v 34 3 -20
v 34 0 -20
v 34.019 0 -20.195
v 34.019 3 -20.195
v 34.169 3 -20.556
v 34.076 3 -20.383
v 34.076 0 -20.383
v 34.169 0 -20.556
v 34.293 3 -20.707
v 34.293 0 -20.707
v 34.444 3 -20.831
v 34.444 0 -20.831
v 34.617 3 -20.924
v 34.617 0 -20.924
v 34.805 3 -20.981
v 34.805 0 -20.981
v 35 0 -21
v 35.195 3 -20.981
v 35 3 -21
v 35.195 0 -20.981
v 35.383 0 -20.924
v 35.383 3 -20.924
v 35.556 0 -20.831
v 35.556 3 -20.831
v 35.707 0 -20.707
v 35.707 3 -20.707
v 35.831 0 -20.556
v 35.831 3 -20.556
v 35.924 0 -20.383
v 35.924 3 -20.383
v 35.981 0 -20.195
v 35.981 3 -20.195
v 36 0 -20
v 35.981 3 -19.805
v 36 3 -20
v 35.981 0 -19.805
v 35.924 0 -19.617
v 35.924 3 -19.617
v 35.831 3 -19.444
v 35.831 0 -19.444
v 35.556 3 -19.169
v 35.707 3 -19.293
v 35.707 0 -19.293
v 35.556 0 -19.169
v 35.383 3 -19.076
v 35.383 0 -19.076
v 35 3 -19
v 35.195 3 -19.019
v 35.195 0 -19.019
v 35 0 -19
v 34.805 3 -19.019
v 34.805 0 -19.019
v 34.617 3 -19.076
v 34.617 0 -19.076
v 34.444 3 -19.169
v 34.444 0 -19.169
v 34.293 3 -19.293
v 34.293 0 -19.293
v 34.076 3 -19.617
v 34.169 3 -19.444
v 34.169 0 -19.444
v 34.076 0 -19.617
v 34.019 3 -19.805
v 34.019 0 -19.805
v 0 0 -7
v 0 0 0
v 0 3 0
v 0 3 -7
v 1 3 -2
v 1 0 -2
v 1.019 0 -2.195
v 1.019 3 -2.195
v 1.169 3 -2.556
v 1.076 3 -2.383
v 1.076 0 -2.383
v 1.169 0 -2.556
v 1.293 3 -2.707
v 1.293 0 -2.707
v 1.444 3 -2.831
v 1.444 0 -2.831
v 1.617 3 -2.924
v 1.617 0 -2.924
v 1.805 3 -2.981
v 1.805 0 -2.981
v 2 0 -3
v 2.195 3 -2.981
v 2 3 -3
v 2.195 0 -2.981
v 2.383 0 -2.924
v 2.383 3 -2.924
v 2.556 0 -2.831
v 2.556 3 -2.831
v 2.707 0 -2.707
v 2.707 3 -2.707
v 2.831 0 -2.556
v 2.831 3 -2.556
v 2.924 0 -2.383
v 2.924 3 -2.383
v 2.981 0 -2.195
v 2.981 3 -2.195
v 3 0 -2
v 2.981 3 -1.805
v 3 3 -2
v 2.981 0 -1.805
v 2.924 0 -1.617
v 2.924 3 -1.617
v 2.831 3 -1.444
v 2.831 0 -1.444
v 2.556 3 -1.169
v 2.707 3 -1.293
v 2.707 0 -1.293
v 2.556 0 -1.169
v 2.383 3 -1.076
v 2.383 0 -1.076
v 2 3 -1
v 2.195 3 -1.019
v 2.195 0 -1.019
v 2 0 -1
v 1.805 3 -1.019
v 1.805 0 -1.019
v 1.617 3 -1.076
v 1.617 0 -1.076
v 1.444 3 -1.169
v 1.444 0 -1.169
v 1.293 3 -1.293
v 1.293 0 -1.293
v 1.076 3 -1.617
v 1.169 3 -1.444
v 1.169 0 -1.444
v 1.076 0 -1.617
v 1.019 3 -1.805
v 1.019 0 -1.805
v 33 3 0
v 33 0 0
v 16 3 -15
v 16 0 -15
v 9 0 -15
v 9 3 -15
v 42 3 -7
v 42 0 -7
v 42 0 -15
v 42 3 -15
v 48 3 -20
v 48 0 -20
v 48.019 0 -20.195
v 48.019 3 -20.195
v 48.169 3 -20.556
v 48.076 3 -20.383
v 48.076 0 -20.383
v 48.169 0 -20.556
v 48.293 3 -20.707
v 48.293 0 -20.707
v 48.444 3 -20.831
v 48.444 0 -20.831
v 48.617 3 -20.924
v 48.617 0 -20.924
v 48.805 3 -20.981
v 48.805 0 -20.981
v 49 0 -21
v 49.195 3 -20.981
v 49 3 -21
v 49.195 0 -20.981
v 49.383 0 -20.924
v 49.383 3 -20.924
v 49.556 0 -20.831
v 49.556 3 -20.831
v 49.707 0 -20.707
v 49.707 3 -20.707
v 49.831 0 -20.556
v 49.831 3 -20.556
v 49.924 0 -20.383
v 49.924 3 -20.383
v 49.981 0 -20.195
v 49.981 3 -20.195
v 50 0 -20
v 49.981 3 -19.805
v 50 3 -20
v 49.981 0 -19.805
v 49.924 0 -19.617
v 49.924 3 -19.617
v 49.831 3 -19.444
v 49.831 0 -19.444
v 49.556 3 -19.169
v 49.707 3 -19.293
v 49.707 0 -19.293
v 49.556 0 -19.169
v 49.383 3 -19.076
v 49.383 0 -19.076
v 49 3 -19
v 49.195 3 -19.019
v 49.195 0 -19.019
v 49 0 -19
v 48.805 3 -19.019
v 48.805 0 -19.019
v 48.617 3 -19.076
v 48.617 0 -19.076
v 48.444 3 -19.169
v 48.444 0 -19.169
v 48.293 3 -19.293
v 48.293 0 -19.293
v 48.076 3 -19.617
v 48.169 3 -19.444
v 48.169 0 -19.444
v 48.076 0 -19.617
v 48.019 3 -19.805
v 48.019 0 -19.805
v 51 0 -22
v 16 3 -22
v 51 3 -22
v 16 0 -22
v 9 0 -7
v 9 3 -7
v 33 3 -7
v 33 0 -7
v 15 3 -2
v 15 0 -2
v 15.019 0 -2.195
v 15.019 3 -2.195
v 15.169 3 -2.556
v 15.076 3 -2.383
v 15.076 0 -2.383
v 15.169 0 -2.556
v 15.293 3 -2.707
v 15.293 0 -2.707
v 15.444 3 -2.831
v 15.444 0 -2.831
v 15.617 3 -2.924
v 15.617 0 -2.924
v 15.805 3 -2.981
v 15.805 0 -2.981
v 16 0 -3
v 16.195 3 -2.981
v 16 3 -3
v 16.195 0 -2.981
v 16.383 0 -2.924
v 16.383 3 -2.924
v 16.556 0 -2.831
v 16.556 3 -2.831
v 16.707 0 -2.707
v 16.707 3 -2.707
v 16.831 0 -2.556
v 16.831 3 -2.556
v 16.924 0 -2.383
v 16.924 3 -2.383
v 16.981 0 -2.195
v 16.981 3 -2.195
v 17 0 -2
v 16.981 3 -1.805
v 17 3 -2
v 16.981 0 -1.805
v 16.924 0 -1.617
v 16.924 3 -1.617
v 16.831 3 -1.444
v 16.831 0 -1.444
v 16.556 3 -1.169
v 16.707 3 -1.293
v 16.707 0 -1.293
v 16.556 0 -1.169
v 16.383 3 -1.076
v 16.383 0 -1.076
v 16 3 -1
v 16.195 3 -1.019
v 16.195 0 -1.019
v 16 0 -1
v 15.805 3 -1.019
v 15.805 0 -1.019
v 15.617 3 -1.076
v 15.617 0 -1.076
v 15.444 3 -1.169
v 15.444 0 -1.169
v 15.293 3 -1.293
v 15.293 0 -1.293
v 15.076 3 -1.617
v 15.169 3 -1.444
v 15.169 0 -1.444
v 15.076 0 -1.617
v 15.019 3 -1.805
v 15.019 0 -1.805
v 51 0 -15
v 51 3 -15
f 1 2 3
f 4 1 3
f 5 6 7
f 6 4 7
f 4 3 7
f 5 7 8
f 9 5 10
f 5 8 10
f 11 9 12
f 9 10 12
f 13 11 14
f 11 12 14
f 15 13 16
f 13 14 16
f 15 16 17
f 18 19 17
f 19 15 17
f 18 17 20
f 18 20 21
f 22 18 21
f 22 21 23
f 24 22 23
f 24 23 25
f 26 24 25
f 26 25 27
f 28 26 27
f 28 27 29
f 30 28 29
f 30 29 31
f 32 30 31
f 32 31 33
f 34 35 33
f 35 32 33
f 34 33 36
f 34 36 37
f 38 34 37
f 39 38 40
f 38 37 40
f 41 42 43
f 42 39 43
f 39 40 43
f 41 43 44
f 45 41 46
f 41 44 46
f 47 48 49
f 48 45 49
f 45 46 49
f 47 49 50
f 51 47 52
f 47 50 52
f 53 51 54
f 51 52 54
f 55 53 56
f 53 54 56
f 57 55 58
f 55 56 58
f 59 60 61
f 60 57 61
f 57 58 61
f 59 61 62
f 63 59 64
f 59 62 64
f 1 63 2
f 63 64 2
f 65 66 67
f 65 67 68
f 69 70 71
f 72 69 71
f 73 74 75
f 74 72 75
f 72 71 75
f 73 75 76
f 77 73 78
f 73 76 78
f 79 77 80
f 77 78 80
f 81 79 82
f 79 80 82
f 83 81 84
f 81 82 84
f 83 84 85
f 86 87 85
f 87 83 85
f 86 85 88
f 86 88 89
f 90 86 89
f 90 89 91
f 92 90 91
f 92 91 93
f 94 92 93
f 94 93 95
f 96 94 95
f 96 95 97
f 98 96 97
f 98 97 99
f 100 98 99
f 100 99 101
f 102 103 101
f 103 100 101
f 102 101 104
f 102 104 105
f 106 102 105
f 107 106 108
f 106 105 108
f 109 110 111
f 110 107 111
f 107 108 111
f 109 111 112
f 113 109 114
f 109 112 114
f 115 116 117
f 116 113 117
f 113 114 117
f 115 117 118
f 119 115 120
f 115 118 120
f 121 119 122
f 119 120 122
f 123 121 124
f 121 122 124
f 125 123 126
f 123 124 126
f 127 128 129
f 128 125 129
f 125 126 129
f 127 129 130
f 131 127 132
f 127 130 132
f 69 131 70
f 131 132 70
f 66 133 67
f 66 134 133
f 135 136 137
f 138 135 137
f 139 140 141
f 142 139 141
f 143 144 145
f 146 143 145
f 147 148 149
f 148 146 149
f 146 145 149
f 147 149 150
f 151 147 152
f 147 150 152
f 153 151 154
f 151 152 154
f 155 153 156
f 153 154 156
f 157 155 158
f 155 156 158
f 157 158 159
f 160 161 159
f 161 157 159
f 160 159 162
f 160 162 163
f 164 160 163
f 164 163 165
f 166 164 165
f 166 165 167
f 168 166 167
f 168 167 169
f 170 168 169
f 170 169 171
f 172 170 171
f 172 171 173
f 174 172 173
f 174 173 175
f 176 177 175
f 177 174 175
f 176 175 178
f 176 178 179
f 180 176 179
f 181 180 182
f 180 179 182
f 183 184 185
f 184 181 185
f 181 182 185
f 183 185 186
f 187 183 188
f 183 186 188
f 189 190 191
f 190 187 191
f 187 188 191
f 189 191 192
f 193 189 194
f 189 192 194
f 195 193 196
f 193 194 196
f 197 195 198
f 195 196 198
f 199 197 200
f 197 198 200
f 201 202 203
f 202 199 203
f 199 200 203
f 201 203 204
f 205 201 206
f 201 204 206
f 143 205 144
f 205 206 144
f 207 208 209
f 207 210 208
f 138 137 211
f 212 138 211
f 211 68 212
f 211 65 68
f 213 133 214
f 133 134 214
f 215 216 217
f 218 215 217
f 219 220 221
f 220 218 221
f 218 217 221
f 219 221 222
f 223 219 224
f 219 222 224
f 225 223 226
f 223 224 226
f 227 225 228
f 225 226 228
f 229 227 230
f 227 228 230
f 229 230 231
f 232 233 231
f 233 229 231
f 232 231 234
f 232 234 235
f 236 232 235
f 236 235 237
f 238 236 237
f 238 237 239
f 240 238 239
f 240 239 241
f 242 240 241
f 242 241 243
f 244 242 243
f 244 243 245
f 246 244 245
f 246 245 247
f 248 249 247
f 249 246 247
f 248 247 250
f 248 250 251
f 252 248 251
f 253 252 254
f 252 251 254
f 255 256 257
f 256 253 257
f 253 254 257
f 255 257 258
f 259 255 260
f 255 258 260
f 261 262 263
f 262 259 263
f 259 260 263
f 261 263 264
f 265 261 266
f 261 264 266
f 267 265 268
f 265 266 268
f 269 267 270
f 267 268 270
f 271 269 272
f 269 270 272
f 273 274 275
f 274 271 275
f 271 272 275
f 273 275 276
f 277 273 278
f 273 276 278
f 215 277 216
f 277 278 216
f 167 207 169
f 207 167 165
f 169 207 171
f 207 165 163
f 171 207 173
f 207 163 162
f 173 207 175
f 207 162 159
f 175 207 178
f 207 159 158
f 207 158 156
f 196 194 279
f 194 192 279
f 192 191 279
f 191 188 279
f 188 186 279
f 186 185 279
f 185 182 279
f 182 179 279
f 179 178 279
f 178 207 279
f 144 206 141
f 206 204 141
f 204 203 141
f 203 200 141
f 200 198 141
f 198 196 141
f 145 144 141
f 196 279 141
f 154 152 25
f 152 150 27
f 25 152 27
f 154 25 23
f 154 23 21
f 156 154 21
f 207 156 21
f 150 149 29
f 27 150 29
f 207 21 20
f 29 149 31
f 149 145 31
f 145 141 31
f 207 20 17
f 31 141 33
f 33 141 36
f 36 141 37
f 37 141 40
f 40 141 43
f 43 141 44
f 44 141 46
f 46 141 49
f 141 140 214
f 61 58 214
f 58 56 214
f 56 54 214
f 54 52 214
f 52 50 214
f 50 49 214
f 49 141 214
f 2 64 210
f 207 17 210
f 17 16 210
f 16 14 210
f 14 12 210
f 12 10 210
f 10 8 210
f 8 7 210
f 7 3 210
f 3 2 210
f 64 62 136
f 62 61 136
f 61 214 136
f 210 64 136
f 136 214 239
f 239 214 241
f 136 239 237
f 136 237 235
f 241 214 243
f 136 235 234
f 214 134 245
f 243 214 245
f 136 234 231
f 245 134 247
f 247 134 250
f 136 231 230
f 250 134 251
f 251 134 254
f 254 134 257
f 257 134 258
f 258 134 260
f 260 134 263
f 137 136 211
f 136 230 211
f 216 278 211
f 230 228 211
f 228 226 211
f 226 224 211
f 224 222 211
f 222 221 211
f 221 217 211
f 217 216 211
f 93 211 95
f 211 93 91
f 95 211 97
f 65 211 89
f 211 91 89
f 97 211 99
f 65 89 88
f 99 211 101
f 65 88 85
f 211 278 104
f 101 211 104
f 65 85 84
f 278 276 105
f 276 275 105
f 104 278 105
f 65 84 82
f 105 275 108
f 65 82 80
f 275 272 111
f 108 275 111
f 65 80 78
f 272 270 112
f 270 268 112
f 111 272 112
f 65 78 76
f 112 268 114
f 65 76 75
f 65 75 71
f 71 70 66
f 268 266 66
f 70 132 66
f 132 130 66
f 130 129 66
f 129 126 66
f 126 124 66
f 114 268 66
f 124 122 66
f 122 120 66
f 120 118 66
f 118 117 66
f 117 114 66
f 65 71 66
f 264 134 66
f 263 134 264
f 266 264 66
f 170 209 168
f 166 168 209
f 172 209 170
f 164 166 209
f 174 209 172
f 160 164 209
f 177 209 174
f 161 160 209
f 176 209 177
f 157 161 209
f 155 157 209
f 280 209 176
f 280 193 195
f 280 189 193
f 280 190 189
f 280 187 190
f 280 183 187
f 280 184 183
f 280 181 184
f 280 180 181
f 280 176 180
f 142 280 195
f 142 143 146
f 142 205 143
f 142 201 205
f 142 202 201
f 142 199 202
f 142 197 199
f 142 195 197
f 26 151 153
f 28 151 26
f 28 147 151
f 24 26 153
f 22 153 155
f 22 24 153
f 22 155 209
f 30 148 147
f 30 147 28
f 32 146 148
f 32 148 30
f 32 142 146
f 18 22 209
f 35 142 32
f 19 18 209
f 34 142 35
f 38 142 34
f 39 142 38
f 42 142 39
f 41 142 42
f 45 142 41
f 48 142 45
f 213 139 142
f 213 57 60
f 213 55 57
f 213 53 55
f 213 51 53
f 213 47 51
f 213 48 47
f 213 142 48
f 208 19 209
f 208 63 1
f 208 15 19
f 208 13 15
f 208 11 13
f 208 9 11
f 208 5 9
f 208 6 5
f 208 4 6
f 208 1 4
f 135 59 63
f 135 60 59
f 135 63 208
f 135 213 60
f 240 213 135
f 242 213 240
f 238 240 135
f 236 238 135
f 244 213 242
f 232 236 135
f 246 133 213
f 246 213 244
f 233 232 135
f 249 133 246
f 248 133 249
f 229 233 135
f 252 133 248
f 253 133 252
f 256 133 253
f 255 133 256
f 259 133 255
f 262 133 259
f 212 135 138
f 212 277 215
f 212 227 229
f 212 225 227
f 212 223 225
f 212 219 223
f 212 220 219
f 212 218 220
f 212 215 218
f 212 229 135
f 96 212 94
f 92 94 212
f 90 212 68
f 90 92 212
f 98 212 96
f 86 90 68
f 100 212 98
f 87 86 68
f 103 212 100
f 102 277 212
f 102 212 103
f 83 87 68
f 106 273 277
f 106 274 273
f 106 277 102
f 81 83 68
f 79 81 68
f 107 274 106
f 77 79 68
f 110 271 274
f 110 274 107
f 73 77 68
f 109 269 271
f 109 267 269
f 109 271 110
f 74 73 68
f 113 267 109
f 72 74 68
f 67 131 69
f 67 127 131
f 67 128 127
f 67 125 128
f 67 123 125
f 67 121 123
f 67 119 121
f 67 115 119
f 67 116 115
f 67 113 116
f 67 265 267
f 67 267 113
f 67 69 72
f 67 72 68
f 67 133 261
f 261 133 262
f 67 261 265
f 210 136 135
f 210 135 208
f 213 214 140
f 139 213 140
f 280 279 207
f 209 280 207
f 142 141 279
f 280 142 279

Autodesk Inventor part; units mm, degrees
ref_plane "YZ Plane" through (0, 0, 0) normal (1, 0, 0) x (0, 1, 0)
ref_plane "XZ Plane" through (0, 0, 0) normal (0, 1, 0) x (-1, 0, 0)
ref_plane "XY Plane" through (0, 0, 0) normal (0, 0, 1) x (1, 0, 0)
sketch "Sketch1" plane through (0, 0, 0) normal (0, 1, 0) x (-1, 0, 0)
  line L0 (0, -7) -> (-9, -7)
  line L1 (-18, -7) -> (-18, 0)
  line L2 (-18, 0) -> (-9, 0)
  line L3 (0, 0) -> (0, -7)
  line L4 (-9, -7) -> (-9, -2) construction
  line L5 (-9, -2) -> (-9, 0) construction
  circle A0 centre (-16, -2) radius 1
  line L6 (-16, -2) -> (-9, -2) construction
  line L7 (-9, 0) -> (0, 0)
  line L8 (-9, -7) -> (-18, -7)
  circle A1 centre (-2, -2) radius 1
  circle A2 centre (-35, -20) radius 1
  line L9 (-33, -15) -> (-51, -15)
  line L10 (-51, -15) -> (-51, -22)
  line L11 (-51, -22) -> (-33, -22)
  line L12 (-33, -22) -> (-33, -15)
  line L13 (-35, -20) -> (-35, -22) construction
  line L14 (-42, -15) -> (-42, -22) construction
  circle A3 centre (-49, -20) radius 1
  line L15 (-42, -15) -> (-9, -15)
  line L16 (-9, -15) -> (-9, -7)
  line L17 (-9, -7) -> (-42, -7)
  line L18 (-42, -7) -> (-42, -15)
  line L19 (-33, -15) -> (-16, -15)
  line L20 (-16, -15) -> (-16, -22)
  line L21 (-16, -22) -> (-33, -22)
  line L22 (-33, -22) -> (-33, -15)
  line L23 (-33, -7) -> (-18, -7)
  line L24 (-18, -7) -> (-18, 0)
  line L25 (-18, 0) -> (-33, 0)
  line L26 (-33, 0) -> (-33, -7)
  point P0 (0, 0)
  dimension "d0" = 18
  dimension "d1" = 7
  dimension "d2" = 2
  dimension "d4" = 7
  dimension "d11" = 0
  dimension "d12" = 2
  dimension "d17" = 0
  dimension "d18" = 2
  dimension "d19" = 19
  dimension "d20" = 18
  dimension "d21" = 7
  dimension "d22" = 2
  dimension "d23" = 7
  dimension "d24" = 18
  dimension "d27" = 16
  dimension "d28" = 22
extrude "Extrusion2" add sketch "Sketch1" along normal blind 3
properties part number "game-switch-holder"
